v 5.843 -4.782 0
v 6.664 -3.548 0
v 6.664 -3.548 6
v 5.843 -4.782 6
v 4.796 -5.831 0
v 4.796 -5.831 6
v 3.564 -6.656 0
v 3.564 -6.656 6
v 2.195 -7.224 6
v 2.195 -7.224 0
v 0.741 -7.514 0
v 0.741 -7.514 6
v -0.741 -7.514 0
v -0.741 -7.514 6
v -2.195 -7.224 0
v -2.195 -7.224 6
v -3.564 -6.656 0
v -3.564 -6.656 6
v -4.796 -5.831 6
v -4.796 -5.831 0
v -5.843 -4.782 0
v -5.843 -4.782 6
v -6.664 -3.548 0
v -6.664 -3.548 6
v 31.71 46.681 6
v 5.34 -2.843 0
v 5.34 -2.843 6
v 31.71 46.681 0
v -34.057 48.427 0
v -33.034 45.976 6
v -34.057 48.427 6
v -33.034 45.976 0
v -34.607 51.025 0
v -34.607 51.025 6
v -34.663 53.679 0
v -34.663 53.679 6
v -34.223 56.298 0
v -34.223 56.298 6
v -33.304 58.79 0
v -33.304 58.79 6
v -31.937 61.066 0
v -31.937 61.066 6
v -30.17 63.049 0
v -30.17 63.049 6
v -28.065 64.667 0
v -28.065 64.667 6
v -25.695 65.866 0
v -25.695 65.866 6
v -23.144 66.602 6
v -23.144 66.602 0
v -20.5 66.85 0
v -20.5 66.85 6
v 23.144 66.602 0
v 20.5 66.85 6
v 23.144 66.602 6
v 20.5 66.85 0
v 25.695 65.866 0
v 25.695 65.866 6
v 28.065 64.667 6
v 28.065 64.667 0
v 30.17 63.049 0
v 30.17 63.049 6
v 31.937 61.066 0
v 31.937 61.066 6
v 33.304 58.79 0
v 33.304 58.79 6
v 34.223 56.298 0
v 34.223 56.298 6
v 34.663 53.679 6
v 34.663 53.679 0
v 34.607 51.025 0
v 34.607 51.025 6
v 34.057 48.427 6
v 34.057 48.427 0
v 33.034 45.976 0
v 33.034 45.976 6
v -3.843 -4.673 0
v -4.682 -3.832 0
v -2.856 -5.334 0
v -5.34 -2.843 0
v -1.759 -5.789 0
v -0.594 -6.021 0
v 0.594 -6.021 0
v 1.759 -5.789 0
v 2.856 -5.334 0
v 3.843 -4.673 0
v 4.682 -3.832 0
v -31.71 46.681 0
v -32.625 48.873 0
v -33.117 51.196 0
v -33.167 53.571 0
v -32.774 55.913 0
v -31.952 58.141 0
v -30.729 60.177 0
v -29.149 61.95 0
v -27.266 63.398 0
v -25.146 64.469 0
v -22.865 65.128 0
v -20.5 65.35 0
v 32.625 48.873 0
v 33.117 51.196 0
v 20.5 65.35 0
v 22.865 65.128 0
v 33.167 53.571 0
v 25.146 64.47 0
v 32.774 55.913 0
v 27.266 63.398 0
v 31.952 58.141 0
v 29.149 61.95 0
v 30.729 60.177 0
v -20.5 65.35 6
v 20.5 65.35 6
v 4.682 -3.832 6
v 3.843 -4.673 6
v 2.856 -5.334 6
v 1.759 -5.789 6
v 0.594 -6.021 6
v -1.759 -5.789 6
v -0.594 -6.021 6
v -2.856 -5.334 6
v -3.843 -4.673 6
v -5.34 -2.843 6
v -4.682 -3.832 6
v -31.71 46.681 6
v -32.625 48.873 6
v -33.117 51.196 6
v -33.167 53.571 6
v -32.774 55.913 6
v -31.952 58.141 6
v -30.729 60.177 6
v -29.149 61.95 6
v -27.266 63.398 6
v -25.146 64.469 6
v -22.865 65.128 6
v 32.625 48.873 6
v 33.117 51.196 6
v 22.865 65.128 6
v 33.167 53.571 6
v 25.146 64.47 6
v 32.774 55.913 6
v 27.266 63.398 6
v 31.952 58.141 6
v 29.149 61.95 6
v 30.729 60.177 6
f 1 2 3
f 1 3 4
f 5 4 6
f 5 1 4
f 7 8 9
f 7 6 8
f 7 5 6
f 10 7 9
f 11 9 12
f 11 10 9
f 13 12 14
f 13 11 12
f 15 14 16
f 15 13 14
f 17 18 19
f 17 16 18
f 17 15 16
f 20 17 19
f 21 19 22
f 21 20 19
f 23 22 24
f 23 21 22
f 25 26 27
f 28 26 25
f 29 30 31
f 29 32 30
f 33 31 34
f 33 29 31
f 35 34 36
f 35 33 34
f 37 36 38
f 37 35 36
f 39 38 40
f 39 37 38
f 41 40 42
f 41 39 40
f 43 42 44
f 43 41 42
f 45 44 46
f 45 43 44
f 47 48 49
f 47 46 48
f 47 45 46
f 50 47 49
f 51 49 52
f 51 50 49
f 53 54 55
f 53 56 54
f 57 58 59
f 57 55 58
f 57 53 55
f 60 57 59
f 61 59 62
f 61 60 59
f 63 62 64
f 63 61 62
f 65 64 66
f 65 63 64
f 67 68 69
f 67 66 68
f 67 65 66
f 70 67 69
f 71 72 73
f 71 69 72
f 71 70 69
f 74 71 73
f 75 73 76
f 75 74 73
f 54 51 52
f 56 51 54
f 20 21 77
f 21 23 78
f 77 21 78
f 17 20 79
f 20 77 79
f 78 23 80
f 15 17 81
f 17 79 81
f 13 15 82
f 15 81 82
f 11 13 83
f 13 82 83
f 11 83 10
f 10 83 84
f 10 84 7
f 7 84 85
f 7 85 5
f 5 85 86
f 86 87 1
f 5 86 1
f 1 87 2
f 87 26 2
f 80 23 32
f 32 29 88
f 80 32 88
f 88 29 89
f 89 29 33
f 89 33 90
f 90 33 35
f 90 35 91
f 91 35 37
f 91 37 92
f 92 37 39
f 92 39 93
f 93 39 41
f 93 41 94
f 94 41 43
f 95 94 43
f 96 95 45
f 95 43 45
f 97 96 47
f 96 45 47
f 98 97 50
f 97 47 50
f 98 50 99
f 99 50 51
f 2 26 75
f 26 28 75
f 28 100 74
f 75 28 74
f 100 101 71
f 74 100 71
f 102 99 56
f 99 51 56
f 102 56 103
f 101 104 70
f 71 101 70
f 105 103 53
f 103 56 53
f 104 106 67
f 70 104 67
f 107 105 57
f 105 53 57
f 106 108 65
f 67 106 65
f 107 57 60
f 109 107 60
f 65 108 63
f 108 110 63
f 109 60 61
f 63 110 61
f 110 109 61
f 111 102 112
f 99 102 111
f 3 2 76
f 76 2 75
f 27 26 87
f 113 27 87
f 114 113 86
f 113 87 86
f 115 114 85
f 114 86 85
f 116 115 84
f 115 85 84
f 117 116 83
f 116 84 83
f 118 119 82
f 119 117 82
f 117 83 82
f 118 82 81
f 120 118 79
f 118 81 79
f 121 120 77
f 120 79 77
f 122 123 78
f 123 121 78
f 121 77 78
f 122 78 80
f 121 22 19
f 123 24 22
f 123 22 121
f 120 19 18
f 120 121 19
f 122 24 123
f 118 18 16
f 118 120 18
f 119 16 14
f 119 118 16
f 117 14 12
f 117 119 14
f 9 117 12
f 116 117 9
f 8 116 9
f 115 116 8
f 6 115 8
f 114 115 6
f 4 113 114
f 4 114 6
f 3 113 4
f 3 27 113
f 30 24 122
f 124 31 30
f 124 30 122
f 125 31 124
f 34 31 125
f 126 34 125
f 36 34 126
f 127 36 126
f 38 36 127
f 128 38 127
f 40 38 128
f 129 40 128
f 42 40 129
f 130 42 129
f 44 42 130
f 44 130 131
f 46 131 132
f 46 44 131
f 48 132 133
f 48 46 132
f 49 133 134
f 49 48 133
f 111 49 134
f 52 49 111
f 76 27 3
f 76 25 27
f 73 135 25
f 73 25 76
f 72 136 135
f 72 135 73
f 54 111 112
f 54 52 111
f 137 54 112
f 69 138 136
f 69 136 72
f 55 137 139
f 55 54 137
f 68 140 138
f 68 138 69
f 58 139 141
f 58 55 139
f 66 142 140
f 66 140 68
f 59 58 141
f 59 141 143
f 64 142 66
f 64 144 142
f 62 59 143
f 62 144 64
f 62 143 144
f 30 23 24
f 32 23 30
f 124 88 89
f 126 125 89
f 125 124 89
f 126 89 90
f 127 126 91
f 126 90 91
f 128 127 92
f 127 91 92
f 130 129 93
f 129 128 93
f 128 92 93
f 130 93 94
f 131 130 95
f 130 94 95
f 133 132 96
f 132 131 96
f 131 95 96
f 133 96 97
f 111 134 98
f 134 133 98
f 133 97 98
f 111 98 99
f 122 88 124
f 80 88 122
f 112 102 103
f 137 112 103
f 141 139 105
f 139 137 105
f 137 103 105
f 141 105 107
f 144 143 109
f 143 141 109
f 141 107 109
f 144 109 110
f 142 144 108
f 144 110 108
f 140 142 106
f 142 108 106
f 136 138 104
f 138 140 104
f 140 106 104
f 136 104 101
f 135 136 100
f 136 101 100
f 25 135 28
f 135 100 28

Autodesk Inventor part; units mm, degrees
ref_plane "YZ Plane" through (0, 0, 0) normal (1, 0, 0) x (0, 1, 0)
ref_plane "XZ Plane" through (0, 0, 0) normal (0, 1, 0) x (-1, 0, 0)
ref_plane "XY Plane" through (0, 0, 0) normal (0, 0, 1) x (1, 0, 0)
sketch "Sketch1" plane through (0, 0, 0) normal (0, 0, 1) x (1, 0, 0)
  arc A0 (-5.3402, -2.8434) -> (5.3402, -2.8434) centre (0, 0) ccw
  arc A1 (-6.6642, -3.5484) -> (6.6642, -3.5484) centre (0, 0) ccw
  circle A2 centre (-20.5, 52.65) radius 1.25 projected
  circle A3 centre (20.5, 52.65) radius 1.25 projected
  arc A4 (-20.5, 65.35) -> (-31.71, 46.6812) centre (-20.5, 52.65) ccw
  arc A5 (31.71, 46.6812) -> (20.5, 65.35) centre (20.5, 52.65) ccw
  arc A6 (-20.5, 66.85) -> (-33.034, 45.9762) centre (-20.5, 52.65) ccw
  arc A7 (33.034, 45.9762) -> (20.5, 66.85) centre (20.5, 52.65) ccw
  line L0 (-6.6642, -3.5484) -> (-33.034, 45.9762)
  line L1 (-31.71, 46.6812) -> (-5.3402, -2.8434)
  line L2 (6.6642, -3.5484) -> (33.034, 45.9762)
  line L3 (5.3402, -2.8434) -> (31.71, 46.6812)
  line L4 (-20.5, 66.85) -> (20.5, 66.85)
  line L5 (20.5, 65.35) -> (-20.5, 65.35)
  dimension "d0" = 12.1
  dimension "d4" = 25.4
  dimension "d5" = 25.4
  dimension "d6" = 1.5
  dimension "d7" = 1.5
extrude "Extrusion1" add sketch "Sketch1" along normal blind 6 contours L0 A6 L4 A7 L2 A1
equation "\"d4\" = d5"
properties part number "Belt_A" material "Rubber"
